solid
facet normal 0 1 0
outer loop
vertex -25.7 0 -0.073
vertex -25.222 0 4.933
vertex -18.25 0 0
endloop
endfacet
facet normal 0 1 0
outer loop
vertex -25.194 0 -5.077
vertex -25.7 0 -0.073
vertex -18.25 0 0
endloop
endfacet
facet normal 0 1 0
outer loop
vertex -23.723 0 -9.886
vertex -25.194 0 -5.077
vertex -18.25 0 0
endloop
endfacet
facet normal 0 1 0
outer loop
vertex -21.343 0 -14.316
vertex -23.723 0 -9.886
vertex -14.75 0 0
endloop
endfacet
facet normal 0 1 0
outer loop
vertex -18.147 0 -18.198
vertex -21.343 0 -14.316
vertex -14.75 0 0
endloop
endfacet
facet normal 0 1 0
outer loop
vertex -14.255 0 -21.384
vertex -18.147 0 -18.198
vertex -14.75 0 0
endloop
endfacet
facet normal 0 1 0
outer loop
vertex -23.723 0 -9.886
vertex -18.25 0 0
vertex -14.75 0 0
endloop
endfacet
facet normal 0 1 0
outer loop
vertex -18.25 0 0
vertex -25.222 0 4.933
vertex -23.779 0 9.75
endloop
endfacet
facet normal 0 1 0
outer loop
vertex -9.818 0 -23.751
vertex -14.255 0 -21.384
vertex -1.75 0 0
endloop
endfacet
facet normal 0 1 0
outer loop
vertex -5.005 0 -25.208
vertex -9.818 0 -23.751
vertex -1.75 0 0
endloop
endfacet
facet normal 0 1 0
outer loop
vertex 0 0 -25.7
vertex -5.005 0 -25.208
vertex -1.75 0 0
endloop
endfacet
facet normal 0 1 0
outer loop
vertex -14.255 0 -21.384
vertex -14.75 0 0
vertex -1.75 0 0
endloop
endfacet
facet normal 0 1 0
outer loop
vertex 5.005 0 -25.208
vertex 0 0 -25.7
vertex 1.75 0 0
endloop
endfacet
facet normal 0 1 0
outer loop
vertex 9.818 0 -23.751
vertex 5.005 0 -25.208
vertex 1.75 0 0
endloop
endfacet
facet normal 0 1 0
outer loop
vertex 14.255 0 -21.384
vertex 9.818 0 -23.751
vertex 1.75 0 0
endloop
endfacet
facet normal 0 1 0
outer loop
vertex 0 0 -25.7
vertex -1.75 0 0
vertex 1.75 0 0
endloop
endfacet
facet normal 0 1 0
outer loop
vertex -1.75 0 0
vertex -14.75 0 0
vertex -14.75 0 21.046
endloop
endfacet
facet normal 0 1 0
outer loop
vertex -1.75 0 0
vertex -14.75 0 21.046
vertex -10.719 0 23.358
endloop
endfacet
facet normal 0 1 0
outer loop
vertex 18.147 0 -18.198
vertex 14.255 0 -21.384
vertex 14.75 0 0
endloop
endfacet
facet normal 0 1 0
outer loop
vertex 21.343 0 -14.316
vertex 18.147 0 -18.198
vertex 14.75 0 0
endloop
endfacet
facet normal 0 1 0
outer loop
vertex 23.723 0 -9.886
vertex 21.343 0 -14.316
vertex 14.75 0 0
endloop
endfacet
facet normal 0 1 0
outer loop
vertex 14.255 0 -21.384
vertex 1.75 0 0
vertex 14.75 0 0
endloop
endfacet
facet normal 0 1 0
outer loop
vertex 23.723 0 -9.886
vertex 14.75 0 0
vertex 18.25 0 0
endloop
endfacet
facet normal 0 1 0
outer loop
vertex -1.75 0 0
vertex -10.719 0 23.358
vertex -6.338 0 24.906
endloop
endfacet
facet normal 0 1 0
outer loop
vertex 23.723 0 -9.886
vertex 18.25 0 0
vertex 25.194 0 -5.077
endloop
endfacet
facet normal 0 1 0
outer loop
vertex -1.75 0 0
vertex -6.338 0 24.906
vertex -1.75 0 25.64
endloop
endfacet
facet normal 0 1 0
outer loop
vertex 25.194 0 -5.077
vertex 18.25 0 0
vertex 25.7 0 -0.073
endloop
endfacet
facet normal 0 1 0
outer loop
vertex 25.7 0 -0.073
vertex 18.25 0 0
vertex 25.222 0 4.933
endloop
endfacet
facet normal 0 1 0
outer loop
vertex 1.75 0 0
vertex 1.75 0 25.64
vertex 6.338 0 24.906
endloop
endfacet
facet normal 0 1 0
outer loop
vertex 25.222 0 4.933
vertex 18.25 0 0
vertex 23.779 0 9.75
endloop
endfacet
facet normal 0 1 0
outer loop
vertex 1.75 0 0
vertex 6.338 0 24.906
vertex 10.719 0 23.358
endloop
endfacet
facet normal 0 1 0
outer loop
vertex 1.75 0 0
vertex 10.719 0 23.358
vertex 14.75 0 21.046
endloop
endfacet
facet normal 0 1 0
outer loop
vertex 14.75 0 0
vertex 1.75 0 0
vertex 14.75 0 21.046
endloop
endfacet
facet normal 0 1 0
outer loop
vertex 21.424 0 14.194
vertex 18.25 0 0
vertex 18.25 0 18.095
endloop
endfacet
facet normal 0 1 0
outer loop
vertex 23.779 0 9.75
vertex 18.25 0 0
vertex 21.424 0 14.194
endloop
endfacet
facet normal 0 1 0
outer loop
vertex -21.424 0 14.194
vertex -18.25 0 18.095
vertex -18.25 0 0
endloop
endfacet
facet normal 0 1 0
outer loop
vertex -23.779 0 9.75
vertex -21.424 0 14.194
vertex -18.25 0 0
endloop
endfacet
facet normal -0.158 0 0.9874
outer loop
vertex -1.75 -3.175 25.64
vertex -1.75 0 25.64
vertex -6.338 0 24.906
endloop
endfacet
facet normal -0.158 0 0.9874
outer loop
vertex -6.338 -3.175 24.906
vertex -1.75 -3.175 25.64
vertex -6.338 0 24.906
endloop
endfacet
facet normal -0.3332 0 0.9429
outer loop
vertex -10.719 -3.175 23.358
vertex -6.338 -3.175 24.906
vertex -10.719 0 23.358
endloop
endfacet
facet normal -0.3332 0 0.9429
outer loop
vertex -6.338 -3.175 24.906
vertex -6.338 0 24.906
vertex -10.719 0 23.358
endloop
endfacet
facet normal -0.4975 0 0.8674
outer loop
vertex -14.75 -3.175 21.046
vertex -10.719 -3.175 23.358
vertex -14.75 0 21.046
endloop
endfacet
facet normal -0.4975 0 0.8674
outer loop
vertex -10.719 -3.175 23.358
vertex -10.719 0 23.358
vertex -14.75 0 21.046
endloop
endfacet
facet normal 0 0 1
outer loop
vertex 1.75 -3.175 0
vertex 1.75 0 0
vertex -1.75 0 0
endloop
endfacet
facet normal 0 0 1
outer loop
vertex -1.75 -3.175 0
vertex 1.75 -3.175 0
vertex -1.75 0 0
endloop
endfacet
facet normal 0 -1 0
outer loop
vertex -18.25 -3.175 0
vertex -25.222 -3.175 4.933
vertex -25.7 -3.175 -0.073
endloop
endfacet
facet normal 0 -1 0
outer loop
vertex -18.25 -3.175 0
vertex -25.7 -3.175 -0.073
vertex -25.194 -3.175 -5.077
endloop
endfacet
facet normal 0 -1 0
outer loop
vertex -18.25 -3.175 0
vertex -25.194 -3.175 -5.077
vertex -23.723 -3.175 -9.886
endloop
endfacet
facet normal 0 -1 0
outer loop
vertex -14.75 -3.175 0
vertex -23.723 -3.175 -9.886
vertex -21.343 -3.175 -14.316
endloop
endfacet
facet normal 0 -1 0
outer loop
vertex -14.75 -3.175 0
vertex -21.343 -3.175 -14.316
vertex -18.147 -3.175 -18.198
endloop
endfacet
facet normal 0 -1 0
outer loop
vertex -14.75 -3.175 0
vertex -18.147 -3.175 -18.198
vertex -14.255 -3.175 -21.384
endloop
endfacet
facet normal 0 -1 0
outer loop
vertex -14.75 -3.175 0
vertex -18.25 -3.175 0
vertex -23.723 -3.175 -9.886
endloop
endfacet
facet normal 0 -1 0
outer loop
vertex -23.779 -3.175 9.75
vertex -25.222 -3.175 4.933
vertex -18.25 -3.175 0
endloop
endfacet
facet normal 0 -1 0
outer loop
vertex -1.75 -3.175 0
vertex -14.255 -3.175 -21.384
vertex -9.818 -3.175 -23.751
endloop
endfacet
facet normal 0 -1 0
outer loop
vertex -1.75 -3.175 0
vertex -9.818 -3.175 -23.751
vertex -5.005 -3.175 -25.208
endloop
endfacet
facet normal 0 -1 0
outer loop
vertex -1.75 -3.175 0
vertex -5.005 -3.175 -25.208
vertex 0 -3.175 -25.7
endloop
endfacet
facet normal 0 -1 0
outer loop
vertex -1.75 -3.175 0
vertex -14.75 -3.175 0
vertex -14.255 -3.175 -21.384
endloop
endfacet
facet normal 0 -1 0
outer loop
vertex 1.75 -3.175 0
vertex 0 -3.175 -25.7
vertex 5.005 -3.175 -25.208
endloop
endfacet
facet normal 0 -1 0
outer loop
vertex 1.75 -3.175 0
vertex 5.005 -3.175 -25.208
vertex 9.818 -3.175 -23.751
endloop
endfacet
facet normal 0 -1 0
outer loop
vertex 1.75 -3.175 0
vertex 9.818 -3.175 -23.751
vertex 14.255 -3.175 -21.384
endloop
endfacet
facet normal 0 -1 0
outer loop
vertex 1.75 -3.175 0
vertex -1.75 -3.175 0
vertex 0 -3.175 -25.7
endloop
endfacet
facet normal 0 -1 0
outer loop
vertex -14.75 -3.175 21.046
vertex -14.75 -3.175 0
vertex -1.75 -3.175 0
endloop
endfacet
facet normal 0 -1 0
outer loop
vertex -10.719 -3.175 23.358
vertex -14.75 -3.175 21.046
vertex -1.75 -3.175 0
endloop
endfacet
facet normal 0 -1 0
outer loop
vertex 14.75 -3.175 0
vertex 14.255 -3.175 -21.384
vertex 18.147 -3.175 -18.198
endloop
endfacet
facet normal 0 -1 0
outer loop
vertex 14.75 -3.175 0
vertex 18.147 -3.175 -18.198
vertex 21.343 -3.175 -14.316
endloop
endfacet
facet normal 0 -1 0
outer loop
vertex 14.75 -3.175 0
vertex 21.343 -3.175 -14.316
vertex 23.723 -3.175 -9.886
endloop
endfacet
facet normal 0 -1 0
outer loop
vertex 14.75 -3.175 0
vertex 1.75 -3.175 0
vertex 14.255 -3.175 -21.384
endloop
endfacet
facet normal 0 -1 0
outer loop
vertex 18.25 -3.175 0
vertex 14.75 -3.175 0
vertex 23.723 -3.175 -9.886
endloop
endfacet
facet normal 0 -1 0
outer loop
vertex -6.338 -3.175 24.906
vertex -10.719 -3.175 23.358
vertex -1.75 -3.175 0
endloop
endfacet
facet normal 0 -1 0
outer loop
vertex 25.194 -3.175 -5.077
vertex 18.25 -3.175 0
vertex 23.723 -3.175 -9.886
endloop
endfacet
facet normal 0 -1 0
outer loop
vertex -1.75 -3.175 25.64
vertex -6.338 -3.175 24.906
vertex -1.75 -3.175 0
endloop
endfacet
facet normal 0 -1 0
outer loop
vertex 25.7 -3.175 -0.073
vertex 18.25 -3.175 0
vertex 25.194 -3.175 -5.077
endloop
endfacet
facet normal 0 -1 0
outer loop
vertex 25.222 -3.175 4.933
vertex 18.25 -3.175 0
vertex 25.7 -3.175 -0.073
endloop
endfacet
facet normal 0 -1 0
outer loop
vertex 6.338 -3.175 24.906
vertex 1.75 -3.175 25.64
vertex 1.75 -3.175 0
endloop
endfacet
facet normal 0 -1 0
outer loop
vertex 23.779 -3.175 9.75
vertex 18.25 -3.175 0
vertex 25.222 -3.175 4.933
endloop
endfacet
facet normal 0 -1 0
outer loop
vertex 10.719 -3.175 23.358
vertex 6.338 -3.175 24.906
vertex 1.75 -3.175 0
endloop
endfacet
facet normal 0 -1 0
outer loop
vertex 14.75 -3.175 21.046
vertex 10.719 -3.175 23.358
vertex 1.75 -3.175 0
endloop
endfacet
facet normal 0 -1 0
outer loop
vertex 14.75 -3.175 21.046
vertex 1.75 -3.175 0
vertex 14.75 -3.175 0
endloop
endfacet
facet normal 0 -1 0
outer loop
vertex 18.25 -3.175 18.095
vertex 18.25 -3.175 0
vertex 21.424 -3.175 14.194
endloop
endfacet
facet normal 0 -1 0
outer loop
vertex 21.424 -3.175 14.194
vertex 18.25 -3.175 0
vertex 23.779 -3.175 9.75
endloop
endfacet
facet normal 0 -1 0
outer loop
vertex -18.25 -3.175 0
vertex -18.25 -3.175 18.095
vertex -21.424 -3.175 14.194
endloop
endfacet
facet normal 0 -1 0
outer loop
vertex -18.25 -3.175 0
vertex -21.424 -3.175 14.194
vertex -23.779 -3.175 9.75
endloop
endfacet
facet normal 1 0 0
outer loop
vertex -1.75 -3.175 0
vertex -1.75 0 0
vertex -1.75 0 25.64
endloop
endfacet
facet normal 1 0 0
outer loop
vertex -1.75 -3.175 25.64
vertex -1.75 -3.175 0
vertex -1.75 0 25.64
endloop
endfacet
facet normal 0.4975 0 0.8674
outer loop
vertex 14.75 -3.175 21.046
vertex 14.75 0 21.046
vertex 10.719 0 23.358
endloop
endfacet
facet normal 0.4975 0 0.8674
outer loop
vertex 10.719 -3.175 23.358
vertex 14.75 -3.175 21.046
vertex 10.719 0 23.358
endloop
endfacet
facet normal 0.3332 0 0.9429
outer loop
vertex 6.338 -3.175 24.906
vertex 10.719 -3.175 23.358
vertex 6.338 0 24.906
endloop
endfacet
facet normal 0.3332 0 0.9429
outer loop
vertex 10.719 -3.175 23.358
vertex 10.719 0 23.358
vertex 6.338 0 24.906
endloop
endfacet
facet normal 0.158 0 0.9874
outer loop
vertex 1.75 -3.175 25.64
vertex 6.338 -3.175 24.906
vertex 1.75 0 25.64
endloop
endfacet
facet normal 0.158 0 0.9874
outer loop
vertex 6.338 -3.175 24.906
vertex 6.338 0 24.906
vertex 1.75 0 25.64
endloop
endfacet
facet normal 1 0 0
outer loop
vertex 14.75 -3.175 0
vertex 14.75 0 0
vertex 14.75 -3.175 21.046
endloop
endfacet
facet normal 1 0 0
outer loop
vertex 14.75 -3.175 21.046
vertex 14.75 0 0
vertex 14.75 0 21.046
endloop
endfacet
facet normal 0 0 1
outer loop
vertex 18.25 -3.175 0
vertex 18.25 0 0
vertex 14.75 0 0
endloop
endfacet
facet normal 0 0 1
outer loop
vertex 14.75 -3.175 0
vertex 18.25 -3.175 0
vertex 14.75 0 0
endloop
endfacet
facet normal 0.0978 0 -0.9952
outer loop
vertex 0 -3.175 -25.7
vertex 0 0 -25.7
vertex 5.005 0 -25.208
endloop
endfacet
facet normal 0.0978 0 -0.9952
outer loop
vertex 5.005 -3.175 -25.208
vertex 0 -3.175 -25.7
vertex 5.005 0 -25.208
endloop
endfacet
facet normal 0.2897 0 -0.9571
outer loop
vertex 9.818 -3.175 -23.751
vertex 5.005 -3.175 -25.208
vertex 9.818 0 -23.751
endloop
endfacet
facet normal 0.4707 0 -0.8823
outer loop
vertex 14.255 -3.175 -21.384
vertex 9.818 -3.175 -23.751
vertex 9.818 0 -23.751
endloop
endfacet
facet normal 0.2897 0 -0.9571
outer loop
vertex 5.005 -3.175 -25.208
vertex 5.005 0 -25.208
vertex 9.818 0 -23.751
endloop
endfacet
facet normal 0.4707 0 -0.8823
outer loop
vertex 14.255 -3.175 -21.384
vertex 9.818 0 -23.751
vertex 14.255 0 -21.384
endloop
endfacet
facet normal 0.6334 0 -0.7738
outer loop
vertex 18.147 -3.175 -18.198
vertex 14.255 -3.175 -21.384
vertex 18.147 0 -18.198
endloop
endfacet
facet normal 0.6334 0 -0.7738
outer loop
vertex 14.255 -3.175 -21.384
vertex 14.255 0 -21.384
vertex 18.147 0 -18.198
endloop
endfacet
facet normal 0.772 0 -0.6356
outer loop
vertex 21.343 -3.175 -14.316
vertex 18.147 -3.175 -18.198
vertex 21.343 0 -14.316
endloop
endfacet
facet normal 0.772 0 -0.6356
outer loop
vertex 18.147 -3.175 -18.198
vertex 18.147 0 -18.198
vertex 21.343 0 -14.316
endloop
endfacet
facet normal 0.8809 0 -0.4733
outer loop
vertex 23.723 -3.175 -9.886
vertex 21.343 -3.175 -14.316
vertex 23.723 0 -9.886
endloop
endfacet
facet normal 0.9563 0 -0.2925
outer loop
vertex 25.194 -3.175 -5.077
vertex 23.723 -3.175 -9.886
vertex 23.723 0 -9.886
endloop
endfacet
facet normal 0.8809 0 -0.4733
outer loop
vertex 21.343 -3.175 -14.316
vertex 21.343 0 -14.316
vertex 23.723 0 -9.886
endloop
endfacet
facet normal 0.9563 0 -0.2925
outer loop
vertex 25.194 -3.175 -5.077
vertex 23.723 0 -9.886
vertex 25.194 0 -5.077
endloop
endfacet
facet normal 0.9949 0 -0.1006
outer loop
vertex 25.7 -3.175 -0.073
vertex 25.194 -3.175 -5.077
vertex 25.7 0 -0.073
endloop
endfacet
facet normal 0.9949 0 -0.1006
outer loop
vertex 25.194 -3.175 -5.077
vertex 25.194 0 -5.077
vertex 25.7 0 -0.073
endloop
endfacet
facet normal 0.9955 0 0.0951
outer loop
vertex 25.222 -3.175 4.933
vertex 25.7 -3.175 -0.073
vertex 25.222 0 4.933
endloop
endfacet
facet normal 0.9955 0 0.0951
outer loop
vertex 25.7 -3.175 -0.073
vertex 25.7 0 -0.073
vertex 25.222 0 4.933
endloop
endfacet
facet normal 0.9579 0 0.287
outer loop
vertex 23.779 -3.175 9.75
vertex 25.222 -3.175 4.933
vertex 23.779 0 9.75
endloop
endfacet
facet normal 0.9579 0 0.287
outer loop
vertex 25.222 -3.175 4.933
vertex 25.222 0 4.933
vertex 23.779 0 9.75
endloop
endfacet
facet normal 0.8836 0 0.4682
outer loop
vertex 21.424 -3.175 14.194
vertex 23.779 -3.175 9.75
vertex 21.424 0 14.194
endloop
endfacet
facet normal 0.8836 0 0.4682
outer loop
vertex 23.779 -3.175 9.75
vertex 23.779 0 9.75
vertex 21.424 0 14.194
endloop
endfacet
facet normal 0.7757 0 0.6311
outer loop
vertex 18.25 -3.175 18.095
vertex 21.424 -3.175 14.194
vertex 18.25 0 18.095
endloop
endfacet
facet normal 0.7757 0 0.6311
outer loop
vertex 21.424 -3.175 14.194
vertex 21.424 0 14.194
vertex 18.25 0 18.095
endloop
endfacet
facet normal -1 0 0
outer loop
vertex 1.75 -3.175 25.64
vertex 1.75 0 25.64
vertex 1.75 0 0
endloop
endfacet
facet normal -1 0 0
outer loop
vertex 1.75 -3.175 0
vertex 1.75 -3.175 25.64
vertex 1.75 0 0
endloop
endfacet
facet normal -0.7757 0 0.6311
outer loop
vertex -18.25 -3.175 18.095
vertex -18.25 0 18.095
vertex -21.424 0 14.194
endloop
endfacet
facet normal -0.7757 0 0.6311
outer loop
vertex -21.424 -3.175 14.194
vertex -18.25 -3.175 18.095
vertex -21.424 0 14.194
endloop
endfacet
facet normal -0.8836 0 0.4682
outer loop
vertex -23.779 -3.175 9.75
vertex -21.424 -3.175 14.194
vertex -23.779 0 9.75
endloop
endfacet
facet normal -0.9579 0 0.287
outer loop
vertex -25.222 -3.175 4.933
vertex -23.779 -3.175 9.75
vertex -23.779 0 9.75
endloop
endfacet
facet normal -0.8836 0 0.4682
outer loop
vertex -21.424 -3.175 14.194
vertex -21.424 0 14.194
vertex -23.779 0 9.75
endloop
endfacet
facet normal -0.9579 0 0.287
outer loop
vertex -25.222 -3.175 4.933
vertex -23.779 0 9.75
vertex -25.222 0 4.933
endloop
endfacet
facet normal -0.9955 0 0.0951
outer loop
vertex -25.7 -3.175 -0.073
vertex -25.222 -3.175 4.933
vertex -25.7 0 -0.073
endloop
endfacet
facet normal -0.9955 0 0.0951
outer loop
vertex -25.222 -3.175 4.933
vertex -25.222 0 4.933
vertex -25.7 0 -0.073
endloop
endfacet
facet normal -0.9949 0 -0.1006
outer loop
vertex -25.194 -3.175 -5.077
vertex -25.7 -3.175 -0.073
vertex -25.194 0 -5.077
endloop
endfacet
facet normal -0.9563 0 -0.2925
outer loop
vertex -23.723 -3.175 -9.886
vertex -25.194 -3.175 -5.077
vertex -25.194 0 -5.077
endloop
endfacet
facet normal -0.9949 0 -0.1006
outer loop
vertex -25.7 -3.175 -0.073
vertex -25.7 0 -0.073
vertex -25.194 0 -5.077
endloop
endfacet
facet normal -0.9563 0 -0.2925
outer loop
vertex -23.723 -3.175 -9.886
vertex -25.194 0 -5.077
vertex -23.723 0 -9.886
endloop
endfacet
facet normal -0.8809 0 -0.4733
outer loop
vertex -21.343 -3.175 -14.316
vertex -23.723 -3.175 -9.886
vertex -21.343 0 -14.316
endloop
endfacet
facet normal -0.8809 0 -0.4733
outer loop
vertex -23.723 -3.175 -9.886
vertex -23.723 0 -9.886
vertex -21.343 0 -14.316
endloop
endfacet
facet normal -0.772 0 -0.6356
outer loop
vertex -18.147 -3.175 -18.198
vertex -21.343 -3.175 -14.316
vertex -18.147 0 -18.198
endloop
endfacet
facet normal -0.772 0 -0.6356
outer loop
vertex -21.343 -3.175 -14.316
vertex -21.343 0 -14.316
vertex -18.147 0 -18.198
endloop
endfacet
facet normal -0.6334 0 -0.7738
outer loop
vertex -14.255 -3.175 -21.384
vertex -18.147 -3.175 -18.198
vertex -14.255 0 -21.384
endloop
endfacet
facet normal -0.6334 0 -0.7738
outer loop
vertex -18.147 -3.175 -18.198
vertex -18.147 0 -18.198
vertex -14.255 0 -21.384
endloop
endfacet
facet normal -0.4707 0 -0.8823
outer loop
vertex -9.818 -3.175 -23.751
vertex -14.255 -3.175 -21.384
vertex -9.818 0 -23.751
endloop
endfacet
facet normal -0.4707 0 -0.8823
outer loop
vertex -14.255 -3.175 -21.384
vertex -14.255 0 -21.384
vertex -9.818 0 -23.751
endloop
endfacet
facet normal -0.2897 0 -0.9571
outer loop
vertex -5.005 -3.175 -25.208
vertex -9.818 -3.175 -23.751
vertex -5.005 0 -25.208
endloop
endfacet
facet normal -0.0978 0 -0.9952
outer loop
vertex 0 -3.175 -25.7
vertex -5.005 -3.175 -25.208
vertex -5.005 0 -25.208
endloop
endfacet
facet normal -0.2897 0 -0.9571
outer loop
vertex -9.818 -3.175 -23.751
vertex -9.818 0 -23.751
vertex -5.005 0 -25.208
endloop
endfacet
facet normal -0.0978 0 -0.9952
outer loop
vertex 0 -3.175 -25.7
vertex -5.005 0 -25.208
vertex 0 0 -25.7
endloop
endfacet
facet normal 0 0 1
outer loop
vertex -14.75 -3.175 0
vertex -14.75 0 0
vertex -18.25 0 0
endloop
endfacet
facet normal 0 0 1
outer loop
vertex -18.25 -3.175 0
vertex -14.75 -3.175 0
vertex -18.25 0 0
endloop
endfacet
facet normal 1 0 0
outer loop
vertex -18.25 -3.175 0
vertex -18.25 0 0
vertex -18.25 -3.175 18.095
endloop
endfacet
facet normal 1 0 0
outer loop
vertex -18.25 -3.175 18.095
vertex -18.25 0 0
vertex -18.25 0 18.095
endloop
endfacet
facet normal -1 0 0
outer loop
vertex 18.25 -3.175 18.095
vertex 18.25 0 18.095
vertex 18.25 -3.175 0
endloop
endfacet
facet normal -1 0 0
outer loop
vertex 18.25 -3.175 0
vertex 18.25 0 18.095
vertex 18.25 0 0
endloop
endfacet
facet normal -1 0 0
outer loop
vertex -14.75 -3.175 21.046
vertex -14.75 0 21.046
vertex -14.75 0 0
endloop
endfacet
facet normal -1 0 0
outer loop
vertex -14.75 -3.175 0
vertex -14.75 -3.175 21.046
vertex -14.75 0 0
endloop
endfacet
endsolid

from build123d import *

# Parameters (mm, degrees)
F1_DEPTH = 3.175


# Not quite as in the source:
# - a length typed as a fraction of an inch, garbled in the dataset ("3 / 203.2 mm" for 3/8 in), is restored


with BuildPart() as f1:
    # F0 (on Front) → F1 (new body)
    with BuildSketch(Plane.XZ):
        with BuildLine():
            Line((18.25, 0), (25.7, 0))
            ThreePointArc((25.7, 0), (23.7646270747, 9.7842986463), (18.25, 18.0949578612))
            Line((18.25, 18.0949578612), (18.25, 0))
        make_face()
        with BuildLine():
            ThreePointArc((-18.25, 18.0949578612), (-23.7646270747, 9.7842986463), (-25.7, 0))
            Line((-25.7, 0), (-18.25, 0))
            Line((-18.25, 0), (-18.25, 18.0949578612))
        make_face()
        with BuildLine():
            Line((14.75, 0), (14.75, 21.0458428199))
            ThreePointArc((14.75, 21.0458428199), (8.5638701474, 24.231180906), (1.75, 25.6403490616))
            Line((1.75, 25.6403490616), (1.75, 12.8201745308))
            Line((1.75, 12.8201745308), (1.75, 0))
            Line((1.75, 0), (14.75, 0))
        make_face()
        with BuildLine():
            Line((-14.75, 0), (-1.75, 0))
            Line((-1.75, 0), (-1.75, 12.8201745308))
            Line((-1.75, 12.8201745308), (-1.75, 25.6403490616))
            ThreePointArc((-1.75, 25.6403490616), (-8.5638701474, 24.231180906), (-14.75, 21.0458428199))
            Line((-14.75, 21.0458428199), (-14.75, 0))
        make_face()
        with BuildLine():
            ThreePointArc((-25.7, 0), (-18.1726442765, -18.1726442765), (0, -25.7))
            Line((0, -25.7), (0, 0))
            Line((0, 0), (-1.75, 0))
            Line((-1.75, 0), (-14.75, 0))
            Line((-14.75, 0), (-18.25, 0))
            Line((-18.25, 0), (-25.7, 0))
        make_face()
        with BuildLine():
            ThreePointArc((0, -25.7), (18.1726442765, -18.1726442765), (25.7, 0))
            Line((25.7, 0), (18.25, 0))
            Line((18.25, 0), (14.75, 0))
            Line((14.75, 0), (1.75, 0))
            Line((1.75, 0), (0, 0))
            Line((0, 0), (0, -25.7))
        make_face()
    extrude(amount=F1_DEPTH)


solid = f1.part
